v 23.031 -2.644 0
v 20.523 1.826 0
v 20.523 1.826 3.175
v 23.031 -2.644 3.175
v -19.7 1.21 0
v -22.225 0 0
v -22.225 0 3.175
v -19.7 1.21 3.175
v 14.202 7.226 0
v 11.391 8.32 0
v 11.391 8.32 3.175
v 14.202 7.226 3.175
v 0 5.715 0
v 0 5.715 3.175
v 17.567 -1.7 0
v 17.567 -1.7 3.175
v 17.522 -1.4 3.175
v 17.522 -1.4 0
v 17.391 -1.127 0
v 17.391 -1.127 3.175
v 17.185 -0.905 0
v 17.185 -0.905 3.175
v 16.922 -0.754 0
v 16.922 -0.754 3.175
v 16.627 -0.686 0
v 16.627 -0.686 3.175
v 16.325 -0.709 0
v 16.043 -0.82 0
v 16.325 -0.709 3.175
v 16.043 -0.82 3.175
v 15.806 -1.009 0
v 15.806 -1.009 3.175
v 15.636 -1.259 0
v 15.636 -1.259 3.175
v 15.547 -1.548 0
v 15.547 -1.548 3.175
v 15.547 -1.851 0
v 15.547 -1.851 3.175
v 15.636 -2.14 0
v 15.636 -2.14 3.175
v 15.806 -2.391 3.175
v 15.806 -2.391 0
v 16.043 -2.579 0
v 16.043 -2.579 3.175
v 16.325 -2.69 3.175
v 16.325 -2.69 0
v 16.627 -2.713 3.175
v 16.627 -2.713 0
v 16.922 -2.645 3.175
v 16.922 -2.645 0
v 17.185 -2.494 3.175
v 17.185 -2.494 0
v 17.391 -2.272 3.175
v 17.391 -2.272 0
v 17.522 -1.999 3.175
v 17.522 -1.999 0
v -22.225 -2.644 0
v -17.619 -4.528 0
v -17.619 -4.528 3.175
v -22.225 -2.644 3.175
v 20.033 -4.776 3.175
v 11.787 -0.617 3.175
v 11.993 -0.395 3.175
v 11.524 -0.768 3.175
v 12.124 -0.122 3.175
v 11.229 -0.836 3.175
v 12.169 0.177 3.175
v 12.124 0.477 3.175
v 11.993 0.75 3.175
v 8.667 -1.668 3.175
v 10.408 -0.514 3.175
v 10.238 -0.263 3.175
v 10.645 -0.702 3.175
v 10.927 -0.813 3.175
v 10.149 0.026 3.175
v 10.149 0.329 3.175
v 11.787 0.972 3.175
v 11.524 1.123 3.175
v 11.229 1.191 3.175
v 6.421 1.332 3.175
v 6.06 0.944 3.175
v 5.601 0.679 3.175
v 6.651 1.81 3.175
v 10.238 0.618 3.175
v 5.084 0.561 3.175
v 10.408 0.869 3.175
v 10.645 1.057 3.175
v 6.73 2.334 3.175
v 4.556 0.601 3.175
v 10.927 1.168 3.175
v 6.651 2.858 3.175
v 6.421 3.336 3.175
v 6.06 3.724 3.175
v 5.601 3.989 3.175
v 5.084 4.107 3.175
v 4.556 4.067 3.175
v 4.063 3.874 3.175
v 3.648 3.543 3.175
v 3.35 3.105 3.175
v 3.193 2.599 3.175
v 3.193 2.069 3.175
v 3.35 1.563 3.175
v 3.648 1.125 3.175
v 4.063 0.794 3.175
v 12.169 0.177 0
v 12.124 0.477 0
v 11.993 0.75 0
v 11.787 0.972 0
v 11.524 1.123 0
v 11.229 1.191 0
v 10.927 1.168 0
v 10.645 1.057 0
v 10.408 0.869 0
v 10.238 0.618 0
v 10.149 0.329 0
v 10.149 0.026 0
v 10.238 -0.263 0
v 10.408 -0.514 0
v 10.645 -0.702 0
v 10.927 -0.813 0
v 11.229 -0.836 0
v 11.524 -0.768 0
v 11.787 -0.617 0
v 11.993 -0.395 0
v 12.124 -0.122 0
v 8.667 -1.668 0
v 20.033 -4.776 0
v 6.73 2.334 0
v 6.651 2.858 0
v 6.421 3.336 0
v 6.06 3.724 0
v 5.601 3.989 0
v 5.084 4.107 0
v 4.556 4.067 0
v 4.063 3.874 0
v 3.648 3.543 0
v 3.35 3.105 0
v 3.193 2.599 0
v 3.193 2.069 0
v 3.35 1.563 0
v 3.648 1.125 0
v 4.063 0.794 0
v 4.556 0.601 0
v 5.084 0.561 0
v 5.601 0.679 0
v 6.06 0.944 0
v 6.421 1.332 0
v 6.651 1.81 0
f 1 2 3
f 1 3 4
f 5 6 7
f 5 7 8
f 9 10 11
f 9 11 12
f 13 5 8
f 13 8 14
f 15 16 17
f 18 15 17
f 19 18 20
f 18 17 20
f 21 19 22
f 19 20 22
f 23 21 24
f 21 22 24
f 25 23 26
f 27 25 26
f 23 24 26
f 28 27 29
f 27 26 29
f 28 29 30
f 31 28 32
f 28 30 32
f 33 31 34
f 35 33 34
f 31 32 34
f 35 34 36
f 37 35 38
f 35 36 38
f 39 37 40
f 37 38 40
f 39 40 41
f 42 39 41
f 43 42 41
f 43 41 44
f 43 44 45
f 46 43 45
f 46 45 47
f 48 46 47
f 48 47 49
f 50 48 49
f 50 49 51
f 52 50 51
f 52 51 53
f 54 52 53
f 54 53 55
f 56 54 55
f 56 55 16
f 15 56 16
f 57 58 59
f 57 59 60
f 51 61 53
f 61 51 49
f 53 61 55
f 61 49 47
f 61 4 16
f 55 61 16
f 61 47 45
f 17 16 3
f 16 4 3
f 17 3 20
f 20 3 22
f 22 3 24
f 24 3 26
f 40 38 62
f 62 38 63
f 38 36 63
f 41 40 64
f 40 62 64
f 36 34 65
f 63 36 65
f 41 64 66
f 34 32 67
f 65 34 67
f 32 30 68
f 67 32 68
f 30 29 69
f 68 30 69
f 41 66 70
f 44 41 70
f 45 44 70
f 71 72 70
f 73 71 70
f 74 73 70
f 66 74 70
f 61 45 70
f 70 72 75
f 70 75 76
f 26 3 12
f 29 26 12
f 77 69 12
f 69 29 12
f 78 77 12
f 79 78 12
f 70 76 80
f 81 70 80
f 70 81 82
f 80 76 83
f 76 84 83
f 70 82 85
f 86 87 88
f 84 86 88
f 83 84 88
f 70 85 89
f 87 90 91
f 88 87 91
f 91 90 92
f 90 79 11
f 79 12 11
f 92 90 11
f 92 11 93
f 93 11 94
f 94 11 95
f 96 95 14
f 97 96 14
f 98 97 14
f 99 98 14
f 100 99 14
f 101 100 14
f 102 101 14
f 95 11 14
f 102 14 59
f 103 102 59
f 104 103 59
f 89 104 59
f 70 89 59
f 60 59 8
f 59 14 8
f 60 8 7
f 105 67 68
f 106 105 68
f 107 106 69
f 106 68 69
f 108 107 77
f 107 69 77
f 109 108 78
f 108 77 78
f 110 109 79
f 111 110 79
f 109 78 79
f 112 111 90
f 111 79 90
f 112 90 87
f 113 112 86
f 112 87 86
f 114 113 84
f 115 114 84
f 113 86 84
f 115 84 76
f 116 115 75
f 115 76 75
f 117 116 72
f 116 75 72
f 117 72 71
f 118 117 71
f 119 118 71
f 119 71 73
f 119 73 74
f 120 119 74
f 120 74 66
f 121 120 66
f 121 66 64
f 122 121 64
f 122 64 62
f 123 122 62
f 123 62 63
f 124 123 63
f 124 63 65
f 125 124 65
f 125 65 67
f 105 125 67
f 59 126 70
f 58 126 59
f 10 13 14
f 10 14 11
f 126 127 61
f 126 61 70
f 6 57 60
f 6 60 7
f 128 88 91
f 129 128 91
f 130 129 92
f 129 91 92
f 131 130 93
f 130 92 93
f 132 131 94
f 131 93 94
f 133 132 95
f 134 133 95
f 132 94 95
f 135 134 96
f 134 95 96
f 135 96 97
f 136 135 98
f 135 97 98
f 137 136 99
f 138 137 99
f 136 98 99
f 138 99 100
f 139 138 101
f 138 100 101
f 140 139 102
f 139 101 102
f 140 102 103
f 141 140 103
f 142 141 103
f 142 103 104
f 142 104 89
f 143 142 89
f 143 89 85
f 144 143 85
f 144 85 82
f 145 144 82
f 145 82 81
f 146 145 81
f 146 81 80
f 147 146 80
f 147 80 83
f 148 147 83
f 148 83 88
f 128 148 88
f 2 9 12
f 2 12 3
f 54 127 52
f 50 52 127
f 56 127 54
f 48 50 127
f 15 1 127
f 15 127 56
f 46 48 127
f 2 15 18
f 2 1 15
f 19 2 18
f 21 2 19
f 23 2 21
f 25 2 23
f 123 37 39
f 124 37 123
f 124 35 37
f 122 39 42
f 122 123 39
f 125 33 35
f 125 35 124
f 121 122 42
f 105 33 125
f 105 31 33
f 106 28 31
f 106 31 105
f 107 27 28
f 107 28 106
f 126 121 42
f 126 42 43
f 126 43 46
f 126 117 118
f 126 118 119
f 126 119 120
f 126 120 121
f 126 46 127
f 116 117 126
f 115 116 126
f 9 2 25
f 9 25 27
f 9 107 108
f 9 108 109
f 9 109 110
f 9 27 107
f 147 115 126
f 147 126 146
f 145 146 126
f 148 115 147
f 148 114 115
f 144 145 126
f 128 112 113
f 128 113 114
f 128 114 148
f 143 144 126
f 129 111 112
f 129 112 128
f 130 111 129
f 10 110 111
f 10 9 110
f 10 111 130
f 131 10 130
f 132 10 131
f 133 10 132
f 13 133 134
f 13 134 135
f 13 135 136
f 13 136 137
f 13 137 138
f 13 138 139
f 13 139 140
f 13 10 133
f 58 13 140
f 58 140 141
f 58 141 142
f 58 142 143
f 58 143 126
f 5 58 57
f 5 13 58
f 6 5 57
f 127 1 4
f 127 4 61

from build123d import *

# Parameters (mm, degrees)
BOSS_EXTRUDE1_DEPTH = 3.175
SKETCH2_R           = 1.016
SKETCH2_R_2         = 1.778
CUT_EXTRUDE1_DEPTH  = 4.175


with BuildPart() as part:
    # Sketch1 → Boss-Extrude1 (new body)
    with BuildSketch(Plane.XY):
        Polygon((14.202193653, 7.22569581), (20.522953668, 1.825587343), (23.031425106, -2.643692959), (20.033036873, -4.776381895), (8.666728722, -1.668226656), (-17.619055751, -4.527501407), (-22.225, -2.643692959), (-22.225, 0), (-19.700320896, 1.210279341), (0, 5.715), (11.391452648, 8.319795747), align=None)
    extrude(amount=BOSS_EXTRUDE1_DEPTH)

    # Sketch2 → Cut-Extrude1 (cut, through all)
    with BuildSketch(Plane.XY.offset(3.175)):
        with Locations((11.153208162, 0.17748796)):
            Circle(SKETCH2_R)
        with Locations((16.551157276, -1.699576334)):
            Circle(SKETCH2_R)
        with Locations((4.951564402, 2.334026271)):
            Circle(SKETCH2_R_2)
    extrude(amount=-CUT_EXTRUDE1_DEPTH, mode=Mode.SUBTRACT)


solid = part.part
